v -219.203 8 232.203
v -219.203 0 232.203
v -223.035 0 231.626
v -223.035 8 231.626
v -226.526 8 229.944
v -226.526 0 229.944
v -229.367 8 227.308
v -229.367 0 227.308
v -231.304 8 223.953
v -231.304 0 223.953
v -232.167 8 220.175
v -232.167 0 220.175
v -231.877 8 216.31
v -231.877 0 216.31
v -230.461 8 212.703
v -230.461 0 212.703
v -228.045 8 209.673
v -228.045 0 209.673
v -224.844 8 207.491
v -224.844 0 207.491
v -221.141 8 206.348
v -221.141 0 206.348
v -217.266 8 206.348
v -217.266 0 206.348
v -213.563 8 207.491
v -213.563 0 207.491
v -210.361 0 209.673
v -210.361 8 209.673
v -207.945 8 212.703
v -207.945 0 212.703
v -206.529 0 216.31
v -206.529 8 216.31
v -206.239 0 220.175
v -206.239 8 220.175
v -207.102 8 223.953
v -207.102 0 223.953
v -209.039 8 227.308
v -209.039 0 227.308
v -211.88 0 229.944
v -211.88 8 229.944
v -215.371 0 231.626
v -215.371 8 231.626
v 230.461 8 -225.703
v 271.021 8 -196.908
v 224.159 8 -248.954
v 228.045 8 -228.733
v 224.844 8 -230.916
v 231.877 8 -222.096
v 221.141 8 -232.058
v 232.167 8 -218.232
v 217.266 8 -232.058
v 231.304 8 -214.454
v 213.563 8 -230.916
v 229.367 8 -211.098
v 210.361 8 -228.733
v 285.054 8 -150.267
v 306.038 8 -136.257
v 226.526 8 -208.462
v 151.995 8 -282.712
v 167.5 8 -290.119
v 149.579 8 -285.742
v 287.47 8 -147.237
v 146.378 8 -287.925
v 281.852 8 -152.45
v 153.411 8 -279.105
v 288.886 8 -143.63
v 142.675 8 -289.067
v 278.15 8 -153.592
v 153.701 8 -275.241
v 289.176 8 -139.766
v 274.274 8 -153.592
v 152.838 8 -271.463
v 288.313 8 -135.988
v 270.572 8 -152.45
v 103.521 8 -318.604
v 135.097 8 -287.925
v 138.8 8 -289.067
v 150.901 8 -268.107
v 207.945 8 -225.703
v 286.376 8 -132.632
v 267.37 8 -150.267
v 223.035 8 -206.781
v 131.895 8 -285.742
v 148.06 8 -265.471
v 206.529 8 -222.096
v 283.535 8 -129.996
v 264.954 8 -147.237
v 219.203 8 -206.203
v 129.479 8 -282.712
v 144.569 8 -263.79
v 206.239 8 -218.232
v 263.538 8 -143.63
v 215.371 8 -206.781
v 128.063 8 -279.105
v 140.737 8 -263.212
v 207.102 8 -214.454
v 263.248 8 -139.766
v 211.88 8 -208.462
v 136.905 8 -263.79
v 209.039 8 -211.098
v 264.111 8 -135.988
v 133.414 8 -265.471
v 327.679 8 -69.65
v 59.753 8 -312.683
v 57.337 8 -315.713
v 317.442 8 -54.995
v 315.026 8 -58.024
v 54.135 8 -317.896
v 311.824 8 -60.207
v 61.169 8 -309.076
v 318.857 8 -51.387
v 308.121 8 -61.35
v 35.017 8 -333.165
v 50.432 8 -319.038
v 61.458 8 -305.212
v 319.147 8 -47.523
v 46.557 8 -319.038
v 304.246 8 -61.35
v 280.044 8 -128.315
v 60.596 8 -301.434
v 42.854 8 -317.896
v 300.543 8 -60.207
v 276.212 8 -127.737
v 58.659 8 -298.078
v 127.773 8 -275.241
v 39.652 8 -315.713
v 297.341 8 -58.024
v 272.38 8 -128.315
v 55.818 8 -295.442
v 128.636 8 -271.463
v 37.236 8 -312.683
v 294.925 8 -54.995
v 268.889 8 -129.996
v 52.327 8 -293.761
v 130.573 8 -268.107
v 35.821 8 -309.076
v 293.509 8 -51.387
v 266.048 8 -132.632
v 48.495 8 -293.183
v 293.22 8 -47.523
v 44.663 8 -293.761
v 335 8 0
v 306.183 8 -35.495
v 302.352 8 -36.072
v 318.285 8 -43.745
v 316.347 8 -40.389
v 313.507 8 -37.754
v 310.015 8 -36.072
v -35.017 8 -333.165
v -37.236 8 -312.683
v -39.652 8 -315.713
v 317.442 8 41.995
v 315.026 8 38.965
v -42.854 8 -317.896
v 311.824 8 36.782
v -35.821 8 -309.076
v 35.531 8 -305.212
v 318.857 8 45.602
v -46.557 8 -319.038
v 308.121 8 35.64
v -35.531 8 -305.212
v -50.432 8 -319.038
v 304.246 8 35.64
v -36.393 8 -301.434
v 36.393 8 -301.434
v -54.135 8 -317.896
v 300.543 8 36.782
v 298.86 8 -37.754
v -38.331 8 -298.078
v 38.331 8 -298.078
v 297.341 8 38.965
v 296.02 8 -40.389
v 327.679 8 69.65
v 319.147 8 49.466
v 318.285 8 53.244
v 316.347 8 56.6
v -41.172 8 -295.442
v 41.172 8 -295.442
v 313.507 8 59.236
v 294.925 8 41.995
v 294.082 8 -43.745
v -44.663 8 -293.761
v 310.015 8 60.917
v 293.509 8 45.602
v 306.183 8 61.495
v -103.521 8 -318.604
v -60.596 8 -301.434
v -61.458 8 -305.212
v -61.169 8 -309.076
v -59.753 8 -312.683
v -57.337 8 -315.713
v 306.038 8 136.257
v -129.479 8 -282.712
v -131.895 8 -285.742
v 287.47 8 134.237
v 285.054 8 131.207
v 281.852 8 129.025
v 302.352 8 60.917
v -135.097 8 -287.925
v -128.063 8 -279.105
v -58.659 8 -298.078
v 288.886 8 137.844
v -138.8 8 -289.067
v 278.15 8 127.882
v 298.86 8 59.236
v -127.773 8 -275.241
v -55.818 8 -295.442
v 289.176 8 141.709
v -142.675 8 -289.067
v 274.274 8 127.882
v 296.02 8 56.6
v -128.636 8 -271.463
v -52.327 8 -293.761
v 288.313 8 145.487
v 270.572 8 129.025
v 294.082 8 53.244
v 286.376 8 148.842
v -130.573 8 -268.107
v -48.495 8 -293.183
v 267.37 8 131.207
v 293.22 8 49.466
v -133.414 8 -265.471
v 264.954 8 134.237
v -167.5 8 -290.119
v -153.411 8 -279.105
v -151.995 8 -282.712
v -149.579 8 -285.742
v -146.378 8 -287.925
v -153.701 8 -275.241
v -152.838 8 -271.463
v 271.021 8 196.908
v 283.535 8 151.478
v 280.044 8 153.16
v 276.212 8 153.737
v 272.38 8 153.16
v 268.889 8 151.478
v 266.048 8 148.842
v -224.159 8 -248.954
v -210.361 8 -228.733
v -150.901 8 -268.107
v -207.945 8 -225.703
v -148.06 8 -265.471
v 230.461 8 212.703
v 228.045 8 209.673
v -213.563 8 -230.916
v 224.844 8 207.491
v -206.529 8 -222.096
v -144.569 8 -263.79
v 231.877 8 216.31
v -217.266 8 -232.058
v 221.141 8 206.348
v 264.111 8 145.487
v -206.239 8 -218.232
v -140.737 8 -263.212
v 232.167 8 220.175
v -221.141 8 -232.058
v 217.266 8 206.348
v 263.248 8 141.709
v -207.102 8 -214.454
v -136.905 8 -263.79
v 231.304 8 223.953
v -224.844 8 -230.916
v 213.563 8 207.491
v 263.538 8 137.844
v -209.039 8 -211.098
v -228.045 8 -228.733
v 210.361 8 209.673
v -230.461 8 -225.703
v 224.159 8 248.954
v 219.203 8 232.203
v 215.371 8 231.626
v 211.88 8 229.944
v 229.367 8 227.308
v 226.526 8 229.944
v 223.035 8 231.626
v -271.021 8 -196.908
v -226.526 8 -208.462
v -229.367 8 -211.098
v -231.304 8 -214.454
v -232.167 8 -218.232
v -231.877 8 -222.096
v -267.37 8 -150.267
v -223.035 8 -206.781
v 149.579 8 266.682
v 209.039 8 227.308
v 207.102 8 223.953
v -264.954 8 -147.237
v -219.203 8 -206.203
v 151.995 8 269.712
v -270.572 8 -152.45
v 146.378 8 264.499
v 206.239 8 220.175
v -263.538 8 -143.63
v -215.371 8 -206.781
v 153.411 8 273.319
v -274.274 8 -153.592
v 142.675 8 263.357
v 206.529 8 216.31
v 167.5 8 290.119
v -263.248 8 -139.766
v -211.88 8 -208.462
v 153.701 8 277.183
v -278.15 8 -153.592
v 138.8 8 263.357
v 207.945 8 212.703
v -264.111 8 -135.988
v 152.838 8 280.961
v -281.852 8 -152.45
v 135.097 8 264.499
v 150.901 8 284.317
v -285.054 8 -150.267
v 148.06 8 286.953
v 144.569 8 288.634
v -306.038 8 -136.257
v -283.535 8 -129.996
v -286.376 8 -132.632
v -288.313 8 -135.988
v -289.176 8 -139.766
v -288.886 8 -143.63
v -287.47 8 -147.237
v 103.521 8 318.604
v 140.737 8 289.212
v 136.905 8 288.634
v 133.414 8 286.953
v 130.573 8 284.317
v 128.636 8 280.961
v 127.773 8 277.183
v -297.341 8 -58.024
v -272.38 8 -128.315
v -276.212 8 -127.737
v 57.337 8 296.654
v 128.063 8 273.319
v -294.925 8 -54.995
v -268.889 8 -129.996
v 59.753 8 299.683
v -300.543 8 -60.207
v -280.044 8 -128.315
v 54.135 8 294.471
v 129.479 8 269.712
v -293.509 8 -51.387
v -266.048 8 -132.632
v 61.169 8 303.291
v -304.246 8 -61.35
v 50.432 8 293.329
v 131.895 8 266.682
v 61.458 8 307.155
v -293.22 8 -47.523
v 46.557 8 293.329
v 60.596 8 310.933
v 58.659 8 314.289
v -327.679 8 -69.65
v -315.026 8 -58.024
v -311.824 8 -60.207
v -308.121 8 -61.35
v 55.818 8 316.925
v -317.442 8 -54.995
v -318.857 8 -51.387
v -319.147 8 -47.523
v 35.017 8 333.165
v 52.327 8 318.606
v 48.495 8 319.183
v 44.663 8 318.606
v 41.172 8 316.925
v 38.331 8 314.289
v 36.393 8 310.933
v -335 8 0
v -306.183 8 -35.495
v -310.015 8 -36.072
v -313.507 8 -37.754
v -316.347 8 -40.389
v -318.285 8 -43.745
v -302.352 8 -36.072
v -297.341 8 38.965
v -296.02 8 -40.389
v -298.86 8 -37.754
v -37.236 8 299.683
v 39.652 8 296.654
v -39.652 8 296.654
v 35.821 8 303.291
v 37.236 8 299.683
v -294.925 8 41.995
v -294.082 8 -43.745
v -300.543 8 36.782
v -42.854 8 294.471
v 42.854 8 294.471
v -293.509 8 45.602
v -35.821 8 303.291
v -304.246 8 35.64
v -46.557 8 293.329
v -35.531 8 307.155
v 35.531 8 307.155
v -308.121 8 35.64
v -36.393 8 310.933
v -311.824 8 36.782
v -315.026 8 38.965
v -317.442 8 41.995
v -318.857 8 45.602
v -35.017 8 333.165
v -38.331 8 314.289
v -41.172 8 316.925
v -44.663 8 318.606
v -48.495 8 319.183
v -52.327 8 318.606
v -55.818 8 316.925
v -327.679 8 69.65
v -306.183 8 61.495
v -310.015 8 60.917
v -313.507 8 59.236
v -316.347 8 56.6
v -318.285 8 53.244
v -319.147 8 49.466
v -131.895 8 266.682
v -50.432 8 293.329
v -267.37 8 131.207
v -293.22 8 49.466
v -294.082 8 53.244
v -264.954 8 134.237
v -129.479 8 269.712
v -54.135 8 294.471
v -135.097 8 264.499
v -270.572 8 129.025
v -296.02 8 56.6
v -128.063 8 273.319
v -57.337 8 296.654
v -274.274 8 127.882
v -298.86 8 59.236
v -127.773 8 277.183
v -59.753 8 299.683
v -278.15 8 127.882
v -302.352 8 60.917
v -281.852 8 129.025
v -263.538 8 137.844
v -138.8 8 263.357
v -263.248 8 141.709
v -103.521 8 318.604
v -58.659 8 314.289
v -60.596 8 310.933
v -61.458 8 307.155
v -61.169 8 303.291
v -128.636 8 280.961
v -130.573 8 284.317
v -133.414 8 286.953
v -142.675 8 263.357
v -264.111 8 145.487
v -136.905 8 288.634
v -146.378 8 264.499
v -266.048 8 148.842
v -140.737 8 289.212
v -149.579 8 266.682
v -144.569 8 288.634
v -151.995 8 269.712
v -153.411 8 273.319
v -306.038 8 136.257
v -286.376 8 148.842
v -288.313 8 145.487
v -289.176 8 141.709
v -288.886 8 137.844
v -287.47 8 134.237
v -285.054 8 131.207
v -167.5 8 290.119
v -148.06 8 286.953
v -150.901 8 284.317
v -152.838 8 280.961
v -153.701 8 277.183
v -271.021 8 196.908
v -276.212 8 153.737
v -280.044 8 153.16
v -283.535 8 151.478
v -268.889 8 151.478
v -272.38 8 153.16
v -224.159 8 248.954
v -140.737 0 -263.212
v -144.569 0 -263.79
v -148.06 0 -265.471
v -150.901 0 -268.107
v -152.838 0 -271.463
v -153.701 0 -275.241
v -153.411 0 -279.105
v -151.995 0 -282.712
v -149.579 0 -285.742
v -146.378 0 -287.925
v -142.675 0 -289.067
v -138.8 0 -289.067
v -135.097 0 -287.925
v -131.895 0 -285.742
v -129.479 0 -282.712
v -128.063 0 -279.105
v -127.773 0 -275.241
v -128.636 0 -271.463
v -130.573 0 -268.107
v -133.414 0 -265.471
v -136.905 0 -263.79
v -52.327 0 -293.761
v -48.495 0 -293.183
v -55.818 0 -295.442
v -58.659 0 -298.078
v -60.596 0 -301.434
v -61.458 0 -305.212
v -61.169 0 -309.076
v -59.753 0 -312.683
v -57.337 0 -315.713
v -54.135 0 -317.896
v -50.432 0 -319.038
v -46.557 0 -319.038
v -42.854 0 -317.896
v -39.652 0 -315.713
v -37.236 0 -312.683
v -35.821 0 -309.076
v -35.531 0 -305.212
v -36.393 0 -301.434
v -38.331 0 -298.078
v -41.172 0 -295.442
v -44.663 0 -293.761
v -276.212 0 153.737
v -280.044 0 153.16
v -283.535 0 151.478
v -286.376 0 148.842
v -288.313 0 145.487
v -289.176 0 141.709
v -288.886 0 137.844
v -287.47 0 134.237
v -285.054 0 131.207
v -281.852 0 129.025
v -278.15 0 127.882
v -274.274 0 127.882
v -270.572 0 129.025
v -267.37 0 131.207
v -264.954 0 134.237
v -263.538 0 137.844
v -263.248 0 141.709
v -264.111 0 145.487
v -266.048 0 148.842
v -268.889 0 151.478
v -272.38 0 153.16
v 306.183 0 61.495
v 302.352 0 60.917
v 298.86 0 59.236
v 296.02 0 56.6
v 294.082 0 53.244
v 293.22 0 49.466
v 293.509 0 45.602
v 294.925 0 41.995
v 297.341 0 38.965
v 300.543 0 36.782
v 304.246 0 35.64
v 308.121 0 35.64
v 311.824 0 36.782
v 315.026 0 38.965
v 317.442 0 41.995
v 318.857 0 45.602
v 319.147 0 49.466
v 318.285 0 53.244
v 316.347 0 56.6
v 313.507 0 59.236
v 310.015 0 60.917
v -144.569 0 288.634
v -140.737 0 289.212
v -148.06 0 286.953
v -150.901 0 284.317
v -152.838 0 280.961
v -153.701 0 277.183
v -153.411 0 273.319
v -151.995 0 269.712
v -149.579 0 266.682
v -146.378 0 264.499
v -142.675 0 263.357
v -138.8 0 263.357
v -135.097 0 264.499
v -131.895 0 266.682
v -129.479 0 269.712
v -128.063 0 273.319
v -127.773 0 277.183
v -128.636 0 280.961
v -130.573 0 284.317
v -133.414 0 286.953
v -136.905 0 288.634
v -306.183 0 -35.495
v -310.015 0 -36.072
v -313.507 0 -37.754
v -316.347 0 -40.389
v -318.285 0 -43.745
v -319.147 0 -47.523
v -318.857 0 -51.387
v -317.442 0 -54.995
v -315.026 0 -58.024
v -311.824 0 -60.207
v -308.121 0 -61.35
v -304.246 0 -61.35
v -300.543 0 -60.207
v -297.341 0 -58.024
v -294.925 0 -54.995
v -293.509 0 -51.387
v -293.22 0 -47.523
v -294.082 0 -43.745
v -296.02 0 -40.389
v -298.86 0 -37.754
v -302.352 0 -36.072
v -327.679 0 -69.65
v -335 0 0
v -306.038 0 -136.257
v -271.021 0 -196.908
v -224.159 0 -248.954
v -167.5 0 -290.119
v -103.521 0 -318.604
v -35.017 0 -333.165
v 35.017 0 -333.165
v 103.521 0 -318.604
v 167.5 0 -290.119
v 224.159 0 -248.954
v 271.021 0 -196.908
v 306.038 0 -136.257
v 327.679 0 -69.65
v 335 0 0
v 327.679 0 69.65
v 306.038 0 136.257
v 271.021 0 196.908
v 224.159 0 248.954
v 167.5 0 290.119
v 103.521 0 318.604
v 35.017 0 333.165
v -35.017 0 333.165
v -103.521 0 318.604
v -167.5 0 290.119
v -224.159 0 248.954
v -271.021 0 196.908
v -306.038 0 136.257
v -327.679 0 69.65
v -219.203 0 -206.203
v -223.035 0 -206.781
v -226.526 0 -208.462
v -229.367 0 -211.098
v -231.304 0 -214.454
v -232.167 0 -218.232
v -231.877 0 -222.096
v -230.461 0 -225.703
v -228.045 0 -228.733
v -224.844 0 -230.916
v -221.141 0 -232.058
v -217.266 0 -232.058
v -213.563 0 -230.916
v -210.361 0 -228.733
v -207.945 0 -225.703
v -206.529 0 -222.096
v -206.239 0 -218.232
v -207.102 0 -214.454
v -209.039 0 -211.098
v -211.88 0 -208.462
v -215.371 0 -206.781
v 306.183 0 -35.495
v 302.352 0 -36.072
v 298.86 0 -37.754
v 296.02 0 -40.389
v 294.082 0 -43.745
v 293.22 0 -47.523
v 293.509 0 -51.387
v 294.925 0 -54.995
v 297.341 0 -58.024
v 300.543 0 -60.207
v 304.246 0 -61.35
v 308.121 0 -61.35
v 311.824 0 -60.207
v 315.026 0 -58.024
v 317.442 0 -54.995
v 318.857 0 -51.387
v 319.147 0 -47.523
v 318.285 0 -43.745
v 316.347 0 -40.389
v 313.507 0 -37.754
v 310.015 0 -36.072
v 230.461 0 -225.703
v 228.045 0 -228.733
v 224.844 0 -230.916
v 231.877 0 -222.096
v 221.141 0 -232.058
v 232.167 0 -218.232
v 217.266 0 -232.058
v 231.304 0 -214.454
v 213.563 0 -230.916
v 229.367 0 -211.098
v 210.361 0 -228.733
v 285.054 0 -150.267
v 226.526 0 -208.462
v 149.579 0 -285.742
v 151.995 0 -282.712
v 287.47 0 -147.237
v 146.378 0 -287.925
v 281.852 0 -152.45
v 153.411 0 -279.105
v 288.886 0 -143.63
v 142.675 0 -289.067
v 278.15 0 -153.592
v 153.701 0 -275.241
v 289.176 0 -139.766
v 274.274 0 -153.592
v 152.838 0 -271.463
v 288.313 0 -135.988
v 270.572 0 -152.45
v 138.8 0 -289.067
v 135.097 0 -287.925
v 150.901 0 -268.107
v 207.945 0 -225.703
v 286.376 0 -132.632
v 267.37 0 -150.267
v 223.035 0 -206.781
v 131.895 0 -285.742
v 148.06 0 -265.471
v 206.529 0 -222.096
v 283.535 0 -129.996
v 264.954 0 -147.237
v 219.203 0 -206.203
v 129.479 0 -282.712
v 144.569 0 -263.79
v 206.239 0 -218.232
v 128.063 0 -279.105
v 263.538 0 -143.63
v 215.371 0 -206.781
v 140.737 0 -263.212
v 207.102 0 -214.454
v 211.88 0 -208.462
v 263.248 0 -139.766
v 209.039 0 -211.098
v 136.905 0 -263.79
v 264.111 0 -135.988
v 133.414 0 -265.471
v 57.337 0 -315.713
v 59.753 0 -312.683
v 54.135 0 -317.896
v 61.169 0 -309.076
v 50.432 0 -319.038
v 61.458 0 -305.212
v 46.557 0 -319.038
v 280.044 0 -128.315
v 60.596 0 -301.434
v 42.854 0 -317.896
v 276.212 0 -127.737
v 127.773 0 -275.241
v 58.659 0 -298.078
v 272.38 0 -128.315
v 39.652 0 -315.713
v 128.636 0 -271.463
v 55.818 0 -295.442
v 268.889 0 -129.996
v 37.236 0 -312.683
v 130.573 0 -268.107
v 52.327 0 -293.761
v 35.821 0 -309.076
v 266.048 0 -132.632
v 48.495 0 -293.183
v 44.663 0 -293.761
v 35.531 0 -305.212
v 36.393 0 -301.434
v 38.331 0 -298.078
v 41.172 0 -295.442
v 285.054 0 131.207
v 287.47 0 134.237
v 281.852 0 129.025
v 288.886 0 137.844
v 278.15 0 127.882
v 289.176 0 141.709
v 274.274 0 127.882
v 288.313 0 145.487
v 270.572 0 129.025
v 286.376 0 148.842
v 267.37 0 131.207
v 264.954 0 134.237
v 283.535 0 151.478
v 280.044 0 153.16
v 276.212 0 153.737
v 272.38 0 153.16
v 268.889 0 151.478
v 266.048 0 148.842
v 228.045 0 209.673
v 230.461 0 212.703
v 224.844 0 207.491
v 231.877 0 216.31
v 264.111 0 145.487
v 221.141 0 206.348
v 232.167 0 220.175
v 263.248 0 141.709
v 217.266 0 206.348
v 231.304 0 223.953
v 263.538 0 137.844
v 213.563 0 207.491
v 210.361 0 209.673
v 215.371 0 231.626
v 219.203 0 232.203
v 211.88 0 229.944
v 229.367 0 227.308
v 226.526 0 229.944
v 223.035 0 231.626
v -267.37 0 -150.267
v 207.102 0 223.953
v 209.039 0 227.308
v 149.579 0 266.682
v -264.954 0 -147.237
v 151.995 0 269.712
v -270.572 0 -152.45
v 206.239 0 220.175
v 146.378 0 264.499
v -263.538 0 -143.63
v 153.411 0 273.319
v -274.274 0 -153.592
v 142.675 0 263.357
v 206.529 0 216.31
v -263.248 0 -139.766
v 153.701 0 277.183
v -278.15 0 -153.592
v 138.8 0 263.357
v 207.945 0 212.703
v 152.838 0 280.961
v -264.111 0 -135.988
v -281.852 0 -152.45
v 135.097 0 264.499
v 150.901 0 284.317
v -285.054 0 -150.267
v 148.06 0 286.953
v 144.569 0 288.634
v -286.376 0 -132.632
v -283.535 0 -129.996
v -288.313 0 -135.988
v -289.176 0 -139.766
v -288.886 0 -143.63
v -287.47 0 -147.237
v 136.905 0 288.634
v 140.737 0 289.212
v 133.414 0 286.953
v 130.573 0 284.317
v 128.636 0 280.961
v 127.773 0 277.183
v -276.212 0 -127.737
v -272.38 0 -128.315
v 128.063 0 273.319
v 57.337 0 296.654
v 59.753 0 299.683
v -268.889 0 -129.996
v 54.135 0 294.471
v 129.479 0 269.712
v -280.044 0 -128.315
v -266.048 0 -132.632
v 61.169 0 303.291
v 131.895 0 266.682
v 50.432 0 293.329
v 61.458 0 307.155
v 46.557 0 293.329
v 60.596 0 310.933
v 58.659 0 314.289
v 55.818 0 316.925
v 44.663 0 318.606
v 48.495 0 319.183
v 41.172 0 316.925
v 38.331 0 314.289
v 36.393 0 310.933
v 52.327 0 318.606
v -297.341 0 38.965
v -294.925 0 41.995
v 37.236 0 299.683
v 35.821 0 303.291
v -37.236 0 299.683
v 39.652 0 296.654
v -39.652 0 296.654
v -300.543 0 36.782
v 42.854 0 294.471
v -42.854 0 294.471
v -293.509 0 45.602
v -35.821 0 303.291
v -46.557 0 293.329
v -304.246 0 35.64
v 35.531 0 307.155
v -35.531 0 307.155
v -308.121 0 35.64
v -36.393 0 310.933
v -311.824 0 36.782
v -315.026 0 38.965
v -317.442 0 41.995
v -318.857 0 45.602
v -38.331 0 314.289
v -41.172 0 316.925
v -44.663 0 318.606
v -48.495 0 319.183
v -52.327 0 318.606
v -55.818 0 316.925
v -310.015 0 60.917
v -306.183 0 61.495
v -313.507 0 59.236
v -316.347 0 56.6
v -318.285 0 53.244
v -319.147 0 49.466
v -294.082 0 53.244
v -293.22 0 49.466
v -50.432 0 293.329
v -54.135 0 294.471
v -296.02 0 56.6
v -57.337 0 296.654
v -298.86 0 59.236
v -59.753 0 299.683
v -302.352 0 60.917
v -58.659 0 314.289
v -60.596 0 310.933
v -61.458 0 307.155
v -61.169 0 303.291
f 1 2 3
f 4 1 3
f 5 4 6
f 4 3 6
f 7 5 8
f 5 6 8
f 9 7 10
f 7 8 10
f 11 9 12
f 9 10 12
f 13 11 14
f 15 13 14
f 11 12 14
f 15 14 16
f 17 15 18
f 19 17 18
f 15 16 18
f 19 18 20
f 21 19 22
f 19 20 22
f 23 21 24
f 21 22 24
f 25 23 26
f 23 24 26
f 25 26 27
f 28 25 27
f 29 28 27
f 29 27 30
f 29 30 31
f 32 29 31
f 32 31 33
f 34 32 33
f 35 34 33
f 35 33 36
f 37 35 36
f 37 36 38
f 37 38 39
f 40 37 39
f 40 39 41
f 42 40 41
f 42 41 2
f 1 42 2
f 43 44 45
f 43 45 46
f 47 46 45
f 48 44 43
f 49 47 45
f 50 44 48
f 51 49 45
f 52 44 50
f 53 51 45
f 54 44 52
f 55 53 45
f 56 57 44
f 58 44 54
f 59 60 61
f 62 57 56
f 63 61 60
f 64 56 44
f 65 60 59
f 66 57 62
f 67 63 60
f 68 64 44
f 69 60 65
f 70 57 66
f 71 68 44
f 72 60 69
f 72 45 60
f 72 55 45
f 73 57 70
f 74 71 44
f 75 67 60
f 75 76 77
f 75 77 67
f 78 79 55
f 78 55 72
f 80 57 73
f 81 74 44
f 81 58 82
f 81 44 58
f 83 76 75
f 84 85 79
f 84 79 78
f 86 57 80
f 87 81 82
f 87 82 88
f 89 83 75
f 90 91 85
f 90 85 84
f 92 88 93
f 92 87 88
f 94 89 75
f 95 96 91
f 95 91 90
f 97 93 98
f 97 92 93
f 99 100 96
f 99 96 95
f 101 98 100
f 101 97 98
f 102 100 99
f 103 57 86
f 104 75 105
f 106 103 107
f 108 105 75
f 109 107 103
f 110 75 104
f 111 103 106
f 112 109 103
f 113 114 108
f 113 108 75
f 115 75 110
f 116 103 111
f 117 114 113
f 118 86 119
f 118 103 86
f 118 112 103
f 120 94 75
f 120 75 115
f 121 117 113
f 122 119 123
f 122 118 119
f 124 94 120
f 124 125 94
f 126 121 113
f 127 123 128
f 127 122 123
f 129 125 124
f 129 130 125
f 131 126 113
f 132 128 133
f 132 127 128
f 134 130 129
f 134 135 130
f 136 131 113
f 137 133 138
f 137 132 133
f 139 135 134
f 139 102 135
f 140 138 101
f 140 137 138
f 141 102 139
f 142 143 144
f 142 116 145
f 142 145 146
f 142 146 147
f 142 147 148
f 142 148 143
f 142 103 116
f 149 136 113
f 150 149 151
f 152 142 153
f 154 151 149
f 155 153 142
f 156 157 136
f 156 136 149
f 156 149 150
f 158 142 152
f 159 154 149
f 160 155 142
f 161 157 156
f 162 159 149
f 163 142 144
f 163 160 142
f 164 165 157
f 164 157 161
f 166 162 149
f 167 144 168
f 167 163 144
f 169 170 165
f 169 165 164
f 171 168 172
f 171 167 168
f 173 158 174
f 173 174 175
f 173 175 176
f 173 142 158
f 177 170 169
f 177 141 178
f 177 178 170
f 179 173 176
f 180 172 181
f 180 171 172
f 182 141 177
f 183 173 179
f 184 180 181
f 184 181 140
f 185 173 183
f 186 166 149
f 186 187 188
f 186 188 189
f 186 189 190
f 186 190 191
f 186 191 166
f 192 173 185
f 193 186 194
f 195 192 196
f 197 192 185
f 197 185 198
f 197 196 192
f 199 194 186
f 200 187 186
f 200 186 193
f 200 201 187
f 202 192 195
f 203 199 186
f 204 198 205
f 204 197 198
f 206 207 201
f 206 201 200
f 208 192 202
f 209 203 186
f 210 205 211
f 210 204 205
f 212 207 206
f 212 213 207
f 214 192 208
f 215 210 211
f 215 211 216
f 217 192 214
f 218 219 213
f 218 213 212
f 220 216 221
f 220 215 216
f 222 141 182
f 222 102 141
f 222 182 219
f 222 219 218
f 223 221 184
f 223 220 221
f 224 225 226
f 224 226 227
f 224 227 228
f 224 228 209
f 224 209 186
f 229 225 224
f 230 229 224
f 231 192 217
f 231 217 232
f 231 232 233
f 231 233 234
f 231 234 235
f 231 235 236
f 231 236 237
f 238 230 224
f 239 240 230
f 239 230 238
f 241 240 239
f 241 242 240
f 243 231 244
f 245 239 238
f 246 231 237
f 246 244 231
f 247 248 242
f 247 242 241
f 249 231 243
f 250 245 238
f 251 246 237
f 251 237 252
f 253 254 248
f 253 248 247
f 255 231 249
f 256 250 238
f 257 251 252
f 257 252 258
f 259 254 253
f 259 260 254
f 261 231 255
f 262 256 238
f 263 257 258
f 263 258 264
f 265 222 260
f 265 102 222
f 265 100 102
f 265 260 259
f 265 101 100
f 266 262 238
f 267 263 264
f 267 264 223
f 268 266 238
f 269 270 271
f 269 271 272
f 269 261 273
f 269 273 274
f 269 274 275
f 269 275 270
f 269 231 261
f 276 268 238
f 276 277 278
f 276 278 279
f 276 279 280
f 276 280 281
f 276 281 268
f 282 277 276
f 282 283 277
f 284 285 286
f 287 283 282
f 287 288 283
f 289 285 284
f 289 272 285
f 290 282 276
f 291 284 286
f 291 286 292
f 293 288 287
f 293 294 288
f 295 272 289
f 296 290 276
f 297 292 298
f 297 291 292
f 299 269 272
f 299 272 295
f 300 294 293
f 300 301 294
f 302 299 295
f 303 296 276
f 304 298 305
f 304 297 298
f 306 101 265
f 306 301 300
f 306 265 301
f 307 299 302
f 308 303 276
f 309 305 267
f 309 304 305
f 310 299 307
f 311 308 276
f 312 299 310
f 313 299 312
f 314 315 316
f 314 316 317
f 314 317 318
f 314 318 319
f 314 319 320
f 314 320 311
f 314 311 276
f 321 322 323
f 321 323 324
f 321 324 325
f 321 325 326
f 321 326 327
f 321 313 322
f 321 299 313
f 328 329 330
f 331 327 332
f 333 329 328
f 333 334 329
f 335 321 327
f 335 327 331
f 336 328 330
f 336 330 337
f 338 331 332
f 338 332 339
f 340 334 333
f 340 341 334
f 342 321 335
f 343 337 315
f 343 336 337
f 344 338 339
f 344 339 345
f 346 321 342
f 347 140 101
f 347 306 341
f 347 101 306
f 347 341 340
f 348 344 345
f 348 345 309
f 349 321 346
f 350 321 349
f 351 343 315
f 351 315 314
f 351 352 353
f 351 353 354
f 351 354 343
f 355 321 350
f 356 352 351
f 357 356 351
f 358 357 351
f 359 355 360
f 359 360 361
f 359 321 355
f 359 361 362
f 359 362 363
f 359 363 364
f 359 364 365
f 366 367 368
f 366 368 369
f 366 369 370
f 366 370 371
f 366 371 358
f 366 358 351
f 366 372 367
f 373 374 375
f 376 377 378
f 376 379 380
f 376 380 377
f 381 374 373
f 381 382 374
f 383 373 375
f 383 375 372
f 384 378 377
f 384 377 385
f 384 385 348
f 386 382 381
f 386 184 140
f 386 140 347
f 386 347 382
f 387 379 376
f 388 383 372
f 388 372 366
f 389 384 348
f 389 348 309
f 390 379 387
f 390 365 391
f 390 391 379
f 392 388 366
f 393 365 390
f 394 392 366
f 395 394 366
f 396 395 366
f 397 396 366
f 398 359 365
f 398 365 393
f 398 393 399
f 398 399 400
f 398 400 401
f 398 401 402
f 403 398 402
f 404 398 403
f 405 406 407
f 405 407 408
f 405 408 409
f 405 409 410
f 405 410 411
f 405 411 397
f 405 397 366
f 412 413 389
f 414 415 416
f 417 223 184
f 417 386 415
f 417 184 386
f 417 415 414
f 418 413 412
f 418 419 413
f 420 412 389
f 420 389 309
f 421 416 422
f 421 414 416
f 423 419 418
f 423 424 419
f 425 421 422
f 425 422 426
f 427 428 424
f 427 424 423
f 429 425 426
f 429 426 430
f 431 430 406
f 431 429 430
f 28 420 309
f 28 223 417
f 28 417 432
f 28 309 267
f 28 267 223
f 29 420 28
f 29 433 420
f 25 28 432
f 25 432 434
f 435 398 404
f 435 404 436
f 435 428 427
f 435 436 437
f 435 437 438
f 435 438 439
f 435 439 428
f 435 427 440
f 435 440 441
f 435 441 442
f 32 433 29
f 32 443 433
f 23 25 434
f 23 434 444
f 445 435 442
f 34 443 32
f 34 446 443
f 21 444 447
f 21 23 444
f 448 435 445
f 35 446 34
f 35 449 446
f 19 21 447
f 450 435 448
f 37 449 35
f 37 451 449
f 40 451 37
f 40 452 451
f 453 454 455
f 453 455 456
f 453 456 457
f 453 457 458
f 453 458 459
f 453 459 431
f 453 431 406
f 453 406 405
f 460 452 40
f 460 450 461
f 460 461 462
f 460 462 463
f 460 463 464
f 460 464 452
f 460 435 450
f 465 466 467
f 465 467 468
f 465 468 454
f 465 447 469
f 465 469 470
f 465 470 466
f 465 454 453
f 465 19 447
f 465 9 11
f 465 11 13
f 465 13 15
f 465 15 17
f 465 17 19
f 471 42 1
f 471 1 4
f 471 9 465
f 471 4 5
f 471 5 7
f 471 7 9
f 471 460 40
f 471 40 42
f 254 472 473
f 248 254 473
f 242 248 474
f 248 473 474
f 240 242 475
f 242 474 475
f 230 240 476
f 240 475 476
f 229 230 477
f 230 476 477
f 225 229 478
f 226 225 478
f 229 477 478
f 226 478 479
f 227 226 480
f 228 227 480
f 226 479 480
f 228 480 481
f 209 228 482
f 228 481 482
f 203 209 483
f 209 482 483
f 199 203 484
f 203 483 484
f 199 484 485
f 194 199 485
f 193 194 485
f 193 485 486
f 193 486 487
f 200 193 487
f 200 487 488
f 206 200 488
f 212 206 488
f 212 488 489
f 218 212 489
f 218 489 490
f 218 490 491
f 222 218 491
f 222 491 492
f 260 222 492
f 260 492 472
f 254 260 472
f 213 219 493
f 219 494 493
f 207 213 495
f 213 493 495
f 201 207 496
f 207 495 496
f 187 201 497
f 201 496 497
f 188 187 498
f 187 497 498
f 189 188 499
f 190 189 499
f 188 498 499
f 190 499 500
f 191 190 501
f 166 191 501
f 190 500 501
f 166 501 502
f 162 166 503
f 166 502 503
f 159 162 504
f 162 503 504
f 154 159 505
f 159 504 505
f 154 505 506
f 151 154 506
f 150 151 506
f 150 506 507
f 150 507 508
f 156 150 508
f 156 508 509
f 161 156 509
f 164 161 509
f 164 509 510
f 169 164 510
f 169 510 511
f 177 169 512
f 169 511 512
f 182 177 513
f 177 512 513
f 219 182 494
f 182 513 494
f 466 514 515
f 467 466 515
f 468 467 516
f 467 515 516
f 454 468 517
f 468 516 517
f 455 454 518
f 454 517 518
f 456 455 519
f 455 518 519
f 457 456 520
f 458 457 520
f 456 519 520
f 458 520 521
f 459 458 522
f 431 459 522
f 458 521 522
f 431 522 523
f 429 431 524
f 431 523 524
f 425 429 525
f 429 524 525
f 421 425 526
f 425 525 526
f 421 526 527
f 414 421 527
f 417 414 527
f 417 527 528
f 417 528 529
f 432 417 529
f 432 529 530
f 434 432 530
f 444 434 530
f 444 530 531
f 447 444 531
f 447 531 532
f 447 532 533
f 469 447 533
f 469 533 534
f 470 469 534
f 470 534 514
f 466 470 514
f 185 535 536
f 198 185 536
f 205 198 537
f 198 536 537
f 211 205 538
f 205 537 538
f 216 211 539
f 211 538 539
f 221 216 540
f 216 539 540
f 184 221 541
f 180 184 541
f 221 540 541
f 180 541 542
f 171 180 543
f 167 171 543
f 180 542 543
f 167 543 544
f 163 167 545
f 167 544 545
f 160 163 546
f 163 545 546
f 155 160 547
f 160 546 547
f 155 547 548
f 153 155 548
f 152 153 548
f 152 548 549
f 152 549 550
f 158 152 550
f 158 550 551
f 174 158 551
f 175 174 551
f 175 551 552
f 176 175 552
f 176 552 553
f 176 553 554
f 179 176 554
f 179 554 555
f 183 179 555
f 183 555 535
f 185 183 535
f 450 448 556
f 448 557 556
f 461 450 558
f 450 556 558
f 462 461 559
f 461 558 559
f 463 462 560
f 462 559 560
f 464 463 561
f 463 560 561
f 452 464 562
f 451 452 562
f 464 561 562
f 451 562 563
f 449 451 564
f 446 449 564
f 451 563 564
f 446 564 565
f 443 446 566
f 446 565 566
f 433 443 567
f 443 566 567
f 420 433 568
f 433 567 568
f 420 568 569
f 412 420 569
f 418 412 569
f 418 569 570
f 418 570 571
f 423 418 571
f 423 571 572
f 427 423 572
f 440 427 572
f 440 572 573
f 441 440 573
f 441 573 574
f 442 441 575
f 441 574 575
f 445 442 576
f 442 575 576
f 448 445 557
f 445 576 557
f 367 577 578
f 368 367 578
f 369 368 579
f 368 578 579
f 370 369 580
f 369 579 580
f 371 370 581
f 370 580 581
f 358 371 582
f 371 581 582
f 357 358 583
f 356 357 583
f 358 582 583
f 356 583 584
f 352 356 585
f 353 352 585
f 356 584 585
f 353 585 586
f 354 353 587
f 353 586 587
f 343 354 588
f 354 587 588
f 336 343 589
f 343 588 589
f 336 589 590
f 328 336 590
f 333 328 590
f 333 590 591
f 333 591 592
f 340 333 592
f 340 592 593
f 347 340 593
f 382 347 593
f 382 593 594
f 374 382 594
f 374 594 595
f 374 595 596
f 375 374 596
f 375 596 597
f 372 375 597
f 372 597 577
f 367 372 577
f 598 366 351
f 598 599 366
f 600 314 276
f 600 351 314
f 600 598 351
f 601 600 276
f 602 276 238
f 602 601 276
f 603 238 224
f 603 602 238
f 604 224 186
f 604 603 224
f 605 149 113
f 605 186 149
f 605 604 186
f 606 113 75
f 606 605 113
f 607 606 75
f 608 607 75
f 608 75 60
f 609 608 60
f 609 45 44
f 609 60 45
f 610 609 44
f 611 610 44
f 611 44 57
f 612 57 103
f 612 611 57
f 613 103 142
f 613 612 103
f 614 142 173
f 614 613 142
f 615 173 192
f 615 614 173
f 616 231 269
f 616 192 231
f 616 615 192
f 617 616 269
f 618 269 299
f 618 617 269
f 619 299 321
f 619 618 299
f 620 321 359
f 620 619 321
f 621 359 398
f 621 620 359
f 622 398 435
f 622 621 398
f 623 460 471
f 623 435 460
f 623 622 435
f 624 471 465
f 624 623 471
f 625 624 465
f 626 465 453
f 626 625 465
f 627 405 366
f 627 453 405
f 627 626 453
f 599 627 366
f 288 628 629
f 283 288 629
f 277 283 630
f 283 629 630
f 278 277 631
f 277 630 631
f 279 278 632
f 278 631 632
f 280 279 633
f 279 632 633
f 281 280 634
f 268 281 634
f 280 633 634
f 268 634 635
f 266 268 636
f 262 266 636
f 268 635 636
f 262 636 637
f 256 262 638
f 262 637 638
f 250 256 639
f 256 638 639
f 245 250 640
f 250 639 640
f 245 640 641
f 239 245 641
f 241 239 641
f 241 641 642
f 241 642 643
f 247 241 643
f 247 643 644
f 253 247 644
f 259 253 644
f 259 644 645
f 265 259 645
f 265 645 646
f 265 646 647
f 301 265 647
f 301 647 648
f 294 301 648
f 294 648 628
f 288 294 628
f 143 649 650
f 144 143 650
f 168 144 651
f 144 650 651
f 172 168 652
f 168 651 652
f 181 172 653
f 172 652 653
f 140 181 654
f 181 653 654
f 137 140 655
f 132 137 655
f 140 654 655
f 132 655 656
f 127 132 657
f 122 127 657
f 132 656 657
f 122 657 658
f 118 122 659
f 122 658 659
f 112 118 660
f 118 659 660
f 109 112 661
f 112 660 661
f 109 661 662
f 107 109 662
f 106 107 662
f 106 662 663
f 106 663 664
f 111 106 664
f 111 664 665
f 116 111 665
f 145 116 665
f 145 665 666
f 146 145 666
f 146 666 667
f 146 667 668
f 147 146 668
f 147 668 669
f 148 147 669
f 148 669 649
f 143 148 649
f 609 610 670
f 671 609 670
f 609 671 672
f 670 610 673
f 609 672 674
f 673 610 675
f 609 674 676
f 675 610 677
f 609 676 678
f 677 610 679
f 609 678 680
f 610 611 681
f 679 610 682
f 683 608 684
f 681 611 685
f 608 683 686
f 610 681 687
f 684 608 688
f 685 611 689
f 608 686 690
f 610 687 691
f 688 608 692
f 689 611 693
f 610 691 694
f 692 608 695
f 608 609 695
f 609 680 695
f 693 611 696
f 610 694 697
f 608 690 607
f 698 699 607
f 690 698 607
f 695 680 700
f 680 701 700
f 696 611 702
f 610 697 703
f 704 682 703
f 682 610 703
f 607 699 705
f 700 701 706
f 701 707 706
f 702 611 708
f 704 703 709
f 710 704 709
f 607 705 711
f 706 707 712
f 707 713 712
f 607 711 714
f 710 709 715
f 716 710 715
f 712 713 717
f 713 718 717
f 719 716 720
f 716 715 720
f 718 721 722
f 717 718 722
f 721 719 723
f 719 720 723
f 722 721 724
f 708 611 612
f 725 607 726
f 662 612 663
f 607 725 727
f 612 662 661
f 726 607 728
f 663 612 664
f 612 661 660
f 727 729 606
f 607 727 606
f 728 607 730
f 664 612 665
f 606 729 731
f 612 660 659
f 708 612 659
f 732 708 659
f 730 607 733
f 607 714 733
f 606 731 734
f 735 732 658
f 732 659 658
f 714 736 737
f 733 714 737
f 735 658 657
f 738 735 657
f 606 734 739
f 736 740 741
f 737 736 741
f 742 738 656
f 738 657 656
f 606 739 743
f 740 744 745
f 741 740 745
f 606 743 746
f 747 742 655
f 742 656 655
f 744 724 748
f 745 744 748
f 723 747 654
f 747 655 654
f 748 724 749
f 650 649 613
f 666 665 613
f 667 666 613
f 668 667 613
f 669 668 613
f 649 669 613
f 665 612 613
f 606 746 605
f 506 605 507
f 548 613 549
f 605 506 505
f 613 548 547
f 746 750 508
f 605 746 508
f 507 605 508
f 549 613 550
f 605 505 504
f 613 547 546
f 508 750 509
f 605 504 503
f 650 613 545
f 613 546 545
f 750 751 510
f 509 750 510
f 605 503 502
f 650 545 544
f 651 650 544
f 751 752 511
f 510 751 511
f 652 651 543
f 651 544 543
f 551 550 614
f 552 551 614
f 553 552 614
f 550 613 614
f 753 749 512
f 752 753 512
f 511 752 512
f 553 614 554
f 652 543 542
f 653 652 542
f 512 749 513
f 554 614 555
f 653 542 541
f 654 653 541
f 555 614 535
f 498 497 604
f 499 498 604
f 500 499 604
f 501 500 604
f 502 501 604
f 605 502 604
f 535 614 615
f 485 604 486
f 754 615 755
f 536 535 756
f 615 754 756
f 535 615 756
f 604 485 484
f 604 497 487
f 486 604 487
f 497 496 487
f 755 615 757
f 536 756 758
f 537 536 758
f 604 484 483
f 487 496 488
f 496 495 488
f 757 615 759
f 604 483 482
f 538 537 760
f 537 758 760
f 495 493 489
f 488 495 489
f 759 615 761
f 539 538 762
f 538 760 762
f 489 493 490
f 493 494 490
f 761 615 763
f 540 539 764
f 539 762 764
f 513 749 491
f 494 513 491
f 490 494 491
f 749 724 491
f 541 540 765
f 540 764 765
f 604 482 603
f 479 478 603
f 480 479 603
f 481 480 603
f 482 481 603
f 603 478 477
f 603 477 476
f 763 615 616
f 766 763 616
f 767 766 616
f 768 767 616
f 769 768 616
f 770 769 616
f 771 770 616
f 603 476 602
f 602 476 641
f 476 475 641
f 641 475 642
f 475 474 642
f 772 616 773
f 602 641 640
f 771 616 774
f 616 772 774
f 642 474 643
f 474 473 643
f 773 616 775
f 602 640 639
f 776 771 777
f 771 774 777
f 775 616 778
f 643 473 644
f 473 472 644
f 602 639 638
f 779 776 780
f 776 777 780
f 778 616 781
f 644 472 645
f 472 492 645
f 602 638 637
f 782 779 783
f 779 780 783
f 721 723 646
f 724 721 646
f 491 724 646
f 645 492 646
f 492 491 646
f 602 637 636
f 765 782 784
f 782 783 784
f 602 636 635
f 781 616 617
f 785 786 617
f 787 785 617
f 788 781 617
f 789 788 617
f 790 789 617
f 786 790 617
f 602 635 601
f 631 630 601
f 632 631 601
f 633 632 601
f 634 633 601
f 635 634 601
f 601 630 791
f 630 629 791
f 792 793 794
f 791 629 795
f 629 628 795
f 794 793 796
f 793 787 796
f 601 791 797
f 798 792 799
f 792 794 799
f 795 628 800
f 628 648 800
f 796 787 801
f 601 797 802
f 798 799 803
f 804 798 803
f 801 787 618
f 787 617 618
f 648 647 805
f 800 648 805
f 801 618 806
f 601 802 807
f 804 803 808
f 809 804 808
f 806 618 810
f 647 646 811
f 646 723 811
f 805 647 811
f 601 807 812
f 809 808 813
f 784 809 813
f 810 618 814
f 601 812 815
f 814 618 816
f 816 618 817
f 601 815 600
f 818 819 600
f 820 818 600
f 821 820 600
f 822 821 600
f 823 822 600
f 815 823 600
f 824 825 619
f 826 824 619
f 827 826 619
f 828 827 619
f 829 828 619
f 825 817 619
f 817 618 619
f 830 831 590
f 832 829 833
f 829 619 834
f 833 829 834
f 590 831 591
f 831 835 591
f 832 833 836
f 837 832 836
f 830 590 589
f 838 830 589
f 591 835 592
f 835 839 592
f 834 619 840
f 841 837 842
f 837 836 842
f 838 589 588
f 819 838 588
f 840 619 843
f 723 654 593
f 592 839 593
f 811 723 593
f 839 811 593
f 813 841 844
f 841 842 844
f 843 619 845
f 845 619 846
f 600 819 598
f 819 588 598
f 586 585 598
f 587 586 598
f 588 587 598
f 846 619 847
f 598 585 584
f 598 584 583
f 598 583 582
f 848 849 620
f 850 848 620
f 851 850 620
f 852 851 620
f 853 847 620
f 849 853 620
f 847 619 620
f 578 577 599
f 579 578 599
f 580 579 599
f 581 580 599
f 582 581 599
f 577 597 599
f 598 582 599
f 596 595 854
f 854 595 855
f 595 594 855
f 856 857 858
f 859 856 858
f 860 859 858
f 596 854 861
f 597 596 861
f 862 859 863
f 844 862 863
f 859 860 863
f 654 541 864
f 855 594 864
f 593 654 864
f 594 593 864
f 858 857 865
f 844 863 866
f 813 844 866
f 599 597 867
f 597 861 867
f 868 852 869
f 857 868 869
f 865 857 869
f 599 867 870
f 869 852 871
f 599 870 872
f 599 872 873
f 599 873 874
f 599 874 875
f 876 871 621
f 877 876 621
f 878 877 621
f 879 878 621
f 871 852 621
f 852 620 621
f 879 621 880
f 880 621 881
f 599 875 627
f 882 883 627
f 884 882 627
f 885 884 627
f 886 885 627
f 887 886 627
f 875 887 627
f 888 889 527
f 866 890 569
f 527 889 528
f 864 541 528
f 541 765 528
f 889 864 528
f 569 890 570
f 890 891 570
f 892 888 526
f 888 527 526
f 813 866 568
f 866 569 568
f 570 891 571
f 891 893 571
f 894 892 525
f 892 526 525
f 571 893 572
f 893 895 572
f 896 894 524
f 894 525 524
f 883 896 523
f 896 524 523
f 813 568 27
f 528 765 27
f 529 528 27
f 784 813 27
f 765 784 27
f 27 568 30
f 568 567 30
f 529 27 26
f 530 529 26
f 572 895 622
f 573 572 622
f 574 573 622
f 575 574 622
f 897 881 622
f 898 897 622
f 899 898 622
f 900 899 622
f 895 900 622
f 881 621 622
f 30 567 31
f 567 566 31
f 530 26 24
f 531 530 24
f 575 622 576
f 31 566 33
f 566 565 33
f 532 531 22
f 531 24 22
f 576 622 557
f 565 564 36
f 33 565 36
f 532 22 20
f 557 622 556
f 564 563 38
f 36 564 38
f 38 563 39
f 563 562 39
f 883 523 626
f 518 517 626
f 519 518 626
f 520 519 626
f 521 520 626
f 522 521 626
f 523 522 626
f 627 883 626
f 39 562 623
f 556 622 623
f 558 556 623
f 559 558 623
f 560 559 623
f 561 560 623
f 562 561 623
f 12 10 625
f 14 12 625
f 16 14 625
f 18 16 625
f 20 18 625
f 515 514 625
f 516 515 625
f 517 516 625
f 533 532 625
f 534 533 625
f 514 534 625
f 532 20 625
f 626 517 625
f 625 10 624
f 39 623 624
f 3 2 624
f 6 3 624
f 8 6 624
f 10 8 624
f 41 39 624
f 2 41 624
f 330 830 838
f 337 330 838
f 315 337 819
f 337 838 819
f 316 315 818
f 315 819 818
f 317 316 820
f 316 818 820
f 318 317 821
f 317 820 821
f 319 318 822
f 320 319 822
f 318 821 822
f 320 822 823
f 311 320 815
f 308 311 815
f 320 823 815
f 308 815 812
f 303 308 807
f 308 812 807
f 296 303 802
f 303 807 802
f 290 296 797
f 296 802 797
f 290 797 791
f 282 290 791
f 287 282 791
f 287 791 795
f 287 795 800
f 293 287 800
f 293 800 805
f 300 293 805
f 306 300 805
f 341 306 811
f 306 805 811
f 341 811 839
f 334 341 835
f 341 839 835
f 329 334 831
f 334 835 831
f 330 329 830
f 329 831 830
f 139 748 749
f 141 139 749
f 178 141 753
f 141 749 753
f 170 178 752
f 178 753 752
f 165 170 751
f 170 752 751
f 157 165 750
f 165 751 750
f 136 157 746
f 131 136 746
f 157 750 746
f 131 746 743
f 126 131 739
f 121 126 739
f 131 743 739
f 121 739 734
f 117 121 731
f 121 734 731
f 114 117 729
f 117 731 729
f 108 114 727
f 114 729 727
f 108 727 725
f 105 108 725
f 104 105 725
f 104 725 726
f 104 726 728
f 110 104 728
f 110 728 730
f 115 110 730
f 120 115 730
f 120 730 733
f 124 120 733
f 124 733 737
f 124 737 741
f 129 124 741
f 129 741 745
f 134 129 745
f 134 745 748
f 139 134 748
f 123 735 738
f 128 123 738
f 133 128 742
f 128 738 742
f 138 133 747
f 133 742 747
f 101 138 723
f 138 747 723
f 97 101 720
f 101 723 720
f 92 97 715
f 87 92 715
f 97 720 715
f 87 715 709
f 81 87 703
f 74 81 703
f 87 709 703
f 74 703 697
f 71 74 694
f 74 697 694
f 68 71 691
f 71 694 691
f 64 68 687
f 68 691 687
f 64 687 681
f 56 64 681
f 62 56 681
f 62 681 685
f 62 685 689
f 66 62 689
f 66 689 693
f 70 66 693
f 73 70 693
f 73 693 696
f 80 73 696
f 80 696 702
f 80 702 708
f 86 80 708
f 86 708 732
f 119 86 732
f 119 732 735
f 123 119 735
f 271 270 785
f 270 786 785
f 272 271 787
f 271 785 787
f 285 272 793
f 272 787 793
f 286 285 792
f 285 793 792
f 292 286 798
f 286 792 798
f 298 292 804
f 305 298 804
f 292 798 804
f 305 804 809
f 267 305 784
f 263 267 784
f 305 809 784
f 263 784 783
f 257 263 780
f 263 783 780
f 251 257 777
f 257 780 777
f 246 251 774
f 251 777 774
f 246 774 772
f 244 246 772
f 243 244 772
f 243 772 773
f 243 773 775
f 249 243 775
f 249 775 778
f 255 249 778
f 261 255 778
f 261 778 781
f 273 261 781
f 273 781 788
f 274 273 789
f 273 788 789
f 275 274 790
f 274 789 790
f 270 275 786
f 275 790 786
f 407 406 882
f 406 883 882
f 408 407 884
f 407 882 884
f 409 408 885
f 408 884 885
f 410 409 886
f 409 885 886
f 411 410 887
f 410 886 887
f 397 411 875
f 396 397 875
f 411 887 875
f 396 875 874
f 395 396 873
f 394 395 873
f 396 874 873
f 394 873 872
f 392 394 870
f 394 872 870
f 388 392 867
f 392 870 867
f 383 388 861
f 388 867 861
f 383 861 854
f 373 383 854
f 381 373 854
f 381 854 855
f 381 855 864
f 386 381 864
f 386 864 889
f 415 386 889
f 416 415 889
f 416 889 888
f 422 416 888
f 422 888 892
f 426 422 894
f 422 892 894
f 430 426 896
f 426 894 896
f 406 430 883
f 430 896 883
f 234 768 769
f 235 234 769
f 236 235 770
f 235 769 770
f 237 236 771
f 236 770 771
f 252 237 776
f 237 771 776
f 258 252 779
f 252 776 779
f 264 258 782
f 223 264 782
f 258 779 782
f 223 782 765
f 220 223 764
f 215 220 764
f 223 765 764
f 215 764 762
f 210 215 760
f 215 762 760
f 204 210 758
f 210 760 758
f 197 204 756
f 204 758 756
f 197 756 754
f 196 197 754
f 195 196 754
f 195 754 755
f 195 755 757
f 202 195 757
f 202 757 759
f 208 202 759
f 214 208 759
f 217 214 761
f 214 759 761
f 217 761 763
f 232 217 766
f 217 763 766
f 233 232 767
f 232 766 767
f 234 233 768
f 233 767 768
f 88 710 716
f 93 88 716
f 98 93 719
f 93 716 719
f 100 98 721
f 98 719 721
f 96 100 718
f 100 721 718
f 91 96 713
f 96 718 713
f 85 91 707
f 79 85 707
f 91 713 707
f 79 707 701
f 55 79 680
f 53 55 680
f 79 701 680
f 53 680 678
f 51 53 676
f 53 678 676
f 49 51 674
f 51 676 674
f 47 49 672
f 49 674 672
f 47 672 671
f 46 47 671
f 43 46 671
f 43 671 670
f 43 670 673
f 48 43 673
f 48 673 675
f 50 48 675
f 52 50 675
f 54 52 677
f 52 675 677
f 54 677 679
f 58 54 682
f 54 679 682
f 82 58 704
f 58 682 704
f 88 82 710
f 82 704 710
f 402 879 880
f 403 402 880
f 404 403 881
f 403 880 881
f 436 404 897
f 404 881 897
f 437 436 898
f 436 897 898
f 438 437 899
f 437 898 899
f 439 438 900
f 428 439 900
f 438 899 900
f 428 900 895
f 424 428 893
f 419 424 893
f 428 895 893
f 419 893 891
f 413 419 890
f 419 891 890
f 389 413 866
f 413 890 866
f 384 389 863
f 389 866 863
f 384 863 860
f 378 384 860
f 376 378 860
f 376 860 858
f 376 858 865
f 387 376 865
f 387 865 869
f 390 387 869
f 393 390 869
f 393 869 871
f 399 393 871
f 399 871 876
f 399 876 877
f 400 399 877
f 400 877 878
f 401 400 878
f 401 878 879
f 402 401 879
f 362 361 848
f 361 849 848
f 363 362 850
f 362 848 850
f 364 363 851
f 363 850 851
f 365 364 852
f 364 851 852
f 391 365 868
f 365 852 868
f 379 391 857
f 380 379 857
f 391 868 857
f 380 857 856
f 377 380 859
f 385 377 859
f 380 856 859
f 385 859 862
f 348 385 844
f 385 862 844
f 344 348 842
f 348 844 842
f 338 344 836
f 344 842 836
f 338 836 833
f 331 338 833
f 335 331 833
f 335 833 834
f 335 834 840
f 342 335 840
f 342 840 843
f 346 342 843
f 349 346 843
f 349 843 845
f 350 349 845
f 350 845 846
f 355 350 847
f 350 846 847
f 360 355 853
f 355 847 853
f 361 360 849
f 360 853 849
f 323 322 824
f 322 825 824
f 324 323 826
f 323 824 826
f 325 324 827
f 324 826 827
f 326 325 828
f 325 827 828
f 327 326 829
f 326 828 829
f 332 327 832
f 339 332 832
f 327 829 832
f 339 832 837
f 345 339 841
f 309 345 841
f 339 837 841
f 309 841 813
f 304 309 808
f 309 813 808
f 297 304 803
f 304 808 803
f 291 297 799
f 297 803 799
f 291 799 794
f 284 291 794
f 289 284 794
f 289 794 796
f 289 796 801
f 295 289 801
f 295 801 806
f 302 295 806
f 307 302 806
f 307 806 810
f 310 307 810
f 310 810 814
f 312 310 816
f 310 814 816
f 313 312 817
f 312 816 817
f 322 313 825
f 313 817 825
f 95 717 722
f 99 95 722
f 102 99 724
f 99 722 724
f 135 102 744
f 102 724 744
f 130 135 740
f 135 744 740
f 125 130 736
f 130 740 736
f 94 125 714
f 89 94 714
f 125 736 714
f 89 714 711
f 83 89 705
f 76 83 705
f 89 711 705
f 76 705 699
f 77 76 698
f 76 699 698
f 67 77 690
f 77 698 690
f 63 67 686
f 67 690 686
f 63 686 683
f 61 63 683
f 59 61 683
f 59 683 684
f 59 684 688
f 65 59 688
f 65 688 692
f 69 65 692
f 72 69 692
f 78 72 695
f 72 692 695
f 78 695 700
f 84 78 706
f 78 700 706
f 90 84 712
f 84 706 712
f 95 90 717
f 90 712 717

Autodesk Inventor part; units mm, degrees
ref_plane "YZ Plane" through (0, 0, 0) normal (1, 0, 0) x (0, 1, 0)
ref_plane "XZ Plane" through (0, 0, 0) normal (0, 1, 0) x (-1, 0, 0)
ref_plane "XY Plane" through (0, 0, 0) normal (0, 0, 1) x (1, 0, 0)
sketch "Sketch1" plane through (0, 0, 0) normal (0, 1, 0) x (-1, 0, 0)
  circle A0 centre (0, 0) radius 335
  dimension "d0" = 670
extrude "Extrusion1" add sketch "Sketch1" along normal blind 8
sketch "Sketch2" plane through (0, 8, 0) normal (0, 1, 0) x (1, 0, 0)
  circle A0 centre (0, 0) radius 310 construction
  line L0 (0, 0) -> (-310, 0)
  line L1 (0, 0) -> (-306.1834, 48.4947) construction
  point P0 (-306.1834, -48.4947)
  point P1 (-306.1834, -48.4947)
  point P2 (-276.212, -140.7371)
  point P3 (-276.212, -140.7371)
  point P4 (-219.2031, -219.2031)
  point P5 (-219.2031, -219.2031)
  point P6 (-140.7371, -276.212)
  point P7 (-140.7371, -276.212)
  point P8 (-48.4947, -306.1834)
  point P9 (-48.4947, -306.1834)
  point P10 (48.4947, -306.1834)
  point P11 (48.4947, -306.1834)
  point P12 (140.7371, -276.212)
  point P13 (140.7371, -276.212)
  point P14 (219.2031, -219.2031)
  point P15 (219.2031, -219.2031)
  point P16 (276.212, -140.7371)
  point P17 (276.212, -140.7371)
  point P18 (306.1834, -48.4947)
  point P19 (306.1834, -48.4947)
  point P20 (306.1834, 48.4947)
  point P21 (306.1834, 48.4947)
  point P22 (276.212, 140.7371)
  point P23 (276.212, 140.7371)
  point P24 (219.2031, 219.2031)
  point P25 (219.2031, 219.2031)
  point P26 (140.7371, 276.212)
  point P27 (140.7371, 276.212)
  point P28 (48.4947, 306.1834)
  point P29 (48.4947, 306.1834)
  point P30 (-48.4947, 306.1834)
  point P31 (-48.4947, 306.1834)
  point P32 (-140.7371, 276.212)
  point P33 (-140.7371, 276.212)
  point P34 (-219.2031, 219.2031)
  point P35 (-219.2031, 219.2031)
  point P36 (-276.212, 140.7371)
  point P37 (-276.212, 140.7371)
  dimension "d4" = 620
  dimension "d11" = 9
  dimension "d24" = 360
hole "Hole2" at (-306.1834, 8, -48.4947) at (-306.1834, 8, 48.4947) at (-276.212, 8, 140.7371) at (-219.2031, 8, 219.2031) at (-140.7371, 8, 276.212) at (-48.4947, 8, 306.1834) at (48.4947, 8, 306.1834) at (140.7371, 8, 276.212) at (219.2031, 8, 219.2031) at (276.212, 8, 140.7371) at (306.1834, 8, 48.4947) at (306.1834, 8, -48.4947) at (276.212, 8, -140.7371) at (219.2031, 8, -219.2031) at (140.7371, 8, -276.212) at (48.4947, 8, -306.1834) at (-48.4947, 8, -306.1834) at (-140.7371, 8, -276.212) at (-219.2031, 8, -219.2031) at (-276.212, 8, -140.7371) direction (0, -1, 0) diameter 26 end through all
equation "\"d1\" = Thickness"
equation "\"BendRadius\" = Thickness"
equation "\"BendReliefWidth\" = Thickness"
equation "\"BendReliefDepth\" = 0.5 * Thickness"
equation "\"CornerReliefSize\" = 4 * Thickness"
equation "\"MinimumRemnant\" = 2 * Thickness"
equation "\"TransitionRadius\" = BendRadius"
equation "\"JacobiRadiusSize\" = BendRadius"
equation "\"GapSize\" = Thickness"
equation "\"d5\" = Thickness"
equation "\"Thickness\" = 8"
properties part number "PRS 1621 charging hatch D1200 940"
